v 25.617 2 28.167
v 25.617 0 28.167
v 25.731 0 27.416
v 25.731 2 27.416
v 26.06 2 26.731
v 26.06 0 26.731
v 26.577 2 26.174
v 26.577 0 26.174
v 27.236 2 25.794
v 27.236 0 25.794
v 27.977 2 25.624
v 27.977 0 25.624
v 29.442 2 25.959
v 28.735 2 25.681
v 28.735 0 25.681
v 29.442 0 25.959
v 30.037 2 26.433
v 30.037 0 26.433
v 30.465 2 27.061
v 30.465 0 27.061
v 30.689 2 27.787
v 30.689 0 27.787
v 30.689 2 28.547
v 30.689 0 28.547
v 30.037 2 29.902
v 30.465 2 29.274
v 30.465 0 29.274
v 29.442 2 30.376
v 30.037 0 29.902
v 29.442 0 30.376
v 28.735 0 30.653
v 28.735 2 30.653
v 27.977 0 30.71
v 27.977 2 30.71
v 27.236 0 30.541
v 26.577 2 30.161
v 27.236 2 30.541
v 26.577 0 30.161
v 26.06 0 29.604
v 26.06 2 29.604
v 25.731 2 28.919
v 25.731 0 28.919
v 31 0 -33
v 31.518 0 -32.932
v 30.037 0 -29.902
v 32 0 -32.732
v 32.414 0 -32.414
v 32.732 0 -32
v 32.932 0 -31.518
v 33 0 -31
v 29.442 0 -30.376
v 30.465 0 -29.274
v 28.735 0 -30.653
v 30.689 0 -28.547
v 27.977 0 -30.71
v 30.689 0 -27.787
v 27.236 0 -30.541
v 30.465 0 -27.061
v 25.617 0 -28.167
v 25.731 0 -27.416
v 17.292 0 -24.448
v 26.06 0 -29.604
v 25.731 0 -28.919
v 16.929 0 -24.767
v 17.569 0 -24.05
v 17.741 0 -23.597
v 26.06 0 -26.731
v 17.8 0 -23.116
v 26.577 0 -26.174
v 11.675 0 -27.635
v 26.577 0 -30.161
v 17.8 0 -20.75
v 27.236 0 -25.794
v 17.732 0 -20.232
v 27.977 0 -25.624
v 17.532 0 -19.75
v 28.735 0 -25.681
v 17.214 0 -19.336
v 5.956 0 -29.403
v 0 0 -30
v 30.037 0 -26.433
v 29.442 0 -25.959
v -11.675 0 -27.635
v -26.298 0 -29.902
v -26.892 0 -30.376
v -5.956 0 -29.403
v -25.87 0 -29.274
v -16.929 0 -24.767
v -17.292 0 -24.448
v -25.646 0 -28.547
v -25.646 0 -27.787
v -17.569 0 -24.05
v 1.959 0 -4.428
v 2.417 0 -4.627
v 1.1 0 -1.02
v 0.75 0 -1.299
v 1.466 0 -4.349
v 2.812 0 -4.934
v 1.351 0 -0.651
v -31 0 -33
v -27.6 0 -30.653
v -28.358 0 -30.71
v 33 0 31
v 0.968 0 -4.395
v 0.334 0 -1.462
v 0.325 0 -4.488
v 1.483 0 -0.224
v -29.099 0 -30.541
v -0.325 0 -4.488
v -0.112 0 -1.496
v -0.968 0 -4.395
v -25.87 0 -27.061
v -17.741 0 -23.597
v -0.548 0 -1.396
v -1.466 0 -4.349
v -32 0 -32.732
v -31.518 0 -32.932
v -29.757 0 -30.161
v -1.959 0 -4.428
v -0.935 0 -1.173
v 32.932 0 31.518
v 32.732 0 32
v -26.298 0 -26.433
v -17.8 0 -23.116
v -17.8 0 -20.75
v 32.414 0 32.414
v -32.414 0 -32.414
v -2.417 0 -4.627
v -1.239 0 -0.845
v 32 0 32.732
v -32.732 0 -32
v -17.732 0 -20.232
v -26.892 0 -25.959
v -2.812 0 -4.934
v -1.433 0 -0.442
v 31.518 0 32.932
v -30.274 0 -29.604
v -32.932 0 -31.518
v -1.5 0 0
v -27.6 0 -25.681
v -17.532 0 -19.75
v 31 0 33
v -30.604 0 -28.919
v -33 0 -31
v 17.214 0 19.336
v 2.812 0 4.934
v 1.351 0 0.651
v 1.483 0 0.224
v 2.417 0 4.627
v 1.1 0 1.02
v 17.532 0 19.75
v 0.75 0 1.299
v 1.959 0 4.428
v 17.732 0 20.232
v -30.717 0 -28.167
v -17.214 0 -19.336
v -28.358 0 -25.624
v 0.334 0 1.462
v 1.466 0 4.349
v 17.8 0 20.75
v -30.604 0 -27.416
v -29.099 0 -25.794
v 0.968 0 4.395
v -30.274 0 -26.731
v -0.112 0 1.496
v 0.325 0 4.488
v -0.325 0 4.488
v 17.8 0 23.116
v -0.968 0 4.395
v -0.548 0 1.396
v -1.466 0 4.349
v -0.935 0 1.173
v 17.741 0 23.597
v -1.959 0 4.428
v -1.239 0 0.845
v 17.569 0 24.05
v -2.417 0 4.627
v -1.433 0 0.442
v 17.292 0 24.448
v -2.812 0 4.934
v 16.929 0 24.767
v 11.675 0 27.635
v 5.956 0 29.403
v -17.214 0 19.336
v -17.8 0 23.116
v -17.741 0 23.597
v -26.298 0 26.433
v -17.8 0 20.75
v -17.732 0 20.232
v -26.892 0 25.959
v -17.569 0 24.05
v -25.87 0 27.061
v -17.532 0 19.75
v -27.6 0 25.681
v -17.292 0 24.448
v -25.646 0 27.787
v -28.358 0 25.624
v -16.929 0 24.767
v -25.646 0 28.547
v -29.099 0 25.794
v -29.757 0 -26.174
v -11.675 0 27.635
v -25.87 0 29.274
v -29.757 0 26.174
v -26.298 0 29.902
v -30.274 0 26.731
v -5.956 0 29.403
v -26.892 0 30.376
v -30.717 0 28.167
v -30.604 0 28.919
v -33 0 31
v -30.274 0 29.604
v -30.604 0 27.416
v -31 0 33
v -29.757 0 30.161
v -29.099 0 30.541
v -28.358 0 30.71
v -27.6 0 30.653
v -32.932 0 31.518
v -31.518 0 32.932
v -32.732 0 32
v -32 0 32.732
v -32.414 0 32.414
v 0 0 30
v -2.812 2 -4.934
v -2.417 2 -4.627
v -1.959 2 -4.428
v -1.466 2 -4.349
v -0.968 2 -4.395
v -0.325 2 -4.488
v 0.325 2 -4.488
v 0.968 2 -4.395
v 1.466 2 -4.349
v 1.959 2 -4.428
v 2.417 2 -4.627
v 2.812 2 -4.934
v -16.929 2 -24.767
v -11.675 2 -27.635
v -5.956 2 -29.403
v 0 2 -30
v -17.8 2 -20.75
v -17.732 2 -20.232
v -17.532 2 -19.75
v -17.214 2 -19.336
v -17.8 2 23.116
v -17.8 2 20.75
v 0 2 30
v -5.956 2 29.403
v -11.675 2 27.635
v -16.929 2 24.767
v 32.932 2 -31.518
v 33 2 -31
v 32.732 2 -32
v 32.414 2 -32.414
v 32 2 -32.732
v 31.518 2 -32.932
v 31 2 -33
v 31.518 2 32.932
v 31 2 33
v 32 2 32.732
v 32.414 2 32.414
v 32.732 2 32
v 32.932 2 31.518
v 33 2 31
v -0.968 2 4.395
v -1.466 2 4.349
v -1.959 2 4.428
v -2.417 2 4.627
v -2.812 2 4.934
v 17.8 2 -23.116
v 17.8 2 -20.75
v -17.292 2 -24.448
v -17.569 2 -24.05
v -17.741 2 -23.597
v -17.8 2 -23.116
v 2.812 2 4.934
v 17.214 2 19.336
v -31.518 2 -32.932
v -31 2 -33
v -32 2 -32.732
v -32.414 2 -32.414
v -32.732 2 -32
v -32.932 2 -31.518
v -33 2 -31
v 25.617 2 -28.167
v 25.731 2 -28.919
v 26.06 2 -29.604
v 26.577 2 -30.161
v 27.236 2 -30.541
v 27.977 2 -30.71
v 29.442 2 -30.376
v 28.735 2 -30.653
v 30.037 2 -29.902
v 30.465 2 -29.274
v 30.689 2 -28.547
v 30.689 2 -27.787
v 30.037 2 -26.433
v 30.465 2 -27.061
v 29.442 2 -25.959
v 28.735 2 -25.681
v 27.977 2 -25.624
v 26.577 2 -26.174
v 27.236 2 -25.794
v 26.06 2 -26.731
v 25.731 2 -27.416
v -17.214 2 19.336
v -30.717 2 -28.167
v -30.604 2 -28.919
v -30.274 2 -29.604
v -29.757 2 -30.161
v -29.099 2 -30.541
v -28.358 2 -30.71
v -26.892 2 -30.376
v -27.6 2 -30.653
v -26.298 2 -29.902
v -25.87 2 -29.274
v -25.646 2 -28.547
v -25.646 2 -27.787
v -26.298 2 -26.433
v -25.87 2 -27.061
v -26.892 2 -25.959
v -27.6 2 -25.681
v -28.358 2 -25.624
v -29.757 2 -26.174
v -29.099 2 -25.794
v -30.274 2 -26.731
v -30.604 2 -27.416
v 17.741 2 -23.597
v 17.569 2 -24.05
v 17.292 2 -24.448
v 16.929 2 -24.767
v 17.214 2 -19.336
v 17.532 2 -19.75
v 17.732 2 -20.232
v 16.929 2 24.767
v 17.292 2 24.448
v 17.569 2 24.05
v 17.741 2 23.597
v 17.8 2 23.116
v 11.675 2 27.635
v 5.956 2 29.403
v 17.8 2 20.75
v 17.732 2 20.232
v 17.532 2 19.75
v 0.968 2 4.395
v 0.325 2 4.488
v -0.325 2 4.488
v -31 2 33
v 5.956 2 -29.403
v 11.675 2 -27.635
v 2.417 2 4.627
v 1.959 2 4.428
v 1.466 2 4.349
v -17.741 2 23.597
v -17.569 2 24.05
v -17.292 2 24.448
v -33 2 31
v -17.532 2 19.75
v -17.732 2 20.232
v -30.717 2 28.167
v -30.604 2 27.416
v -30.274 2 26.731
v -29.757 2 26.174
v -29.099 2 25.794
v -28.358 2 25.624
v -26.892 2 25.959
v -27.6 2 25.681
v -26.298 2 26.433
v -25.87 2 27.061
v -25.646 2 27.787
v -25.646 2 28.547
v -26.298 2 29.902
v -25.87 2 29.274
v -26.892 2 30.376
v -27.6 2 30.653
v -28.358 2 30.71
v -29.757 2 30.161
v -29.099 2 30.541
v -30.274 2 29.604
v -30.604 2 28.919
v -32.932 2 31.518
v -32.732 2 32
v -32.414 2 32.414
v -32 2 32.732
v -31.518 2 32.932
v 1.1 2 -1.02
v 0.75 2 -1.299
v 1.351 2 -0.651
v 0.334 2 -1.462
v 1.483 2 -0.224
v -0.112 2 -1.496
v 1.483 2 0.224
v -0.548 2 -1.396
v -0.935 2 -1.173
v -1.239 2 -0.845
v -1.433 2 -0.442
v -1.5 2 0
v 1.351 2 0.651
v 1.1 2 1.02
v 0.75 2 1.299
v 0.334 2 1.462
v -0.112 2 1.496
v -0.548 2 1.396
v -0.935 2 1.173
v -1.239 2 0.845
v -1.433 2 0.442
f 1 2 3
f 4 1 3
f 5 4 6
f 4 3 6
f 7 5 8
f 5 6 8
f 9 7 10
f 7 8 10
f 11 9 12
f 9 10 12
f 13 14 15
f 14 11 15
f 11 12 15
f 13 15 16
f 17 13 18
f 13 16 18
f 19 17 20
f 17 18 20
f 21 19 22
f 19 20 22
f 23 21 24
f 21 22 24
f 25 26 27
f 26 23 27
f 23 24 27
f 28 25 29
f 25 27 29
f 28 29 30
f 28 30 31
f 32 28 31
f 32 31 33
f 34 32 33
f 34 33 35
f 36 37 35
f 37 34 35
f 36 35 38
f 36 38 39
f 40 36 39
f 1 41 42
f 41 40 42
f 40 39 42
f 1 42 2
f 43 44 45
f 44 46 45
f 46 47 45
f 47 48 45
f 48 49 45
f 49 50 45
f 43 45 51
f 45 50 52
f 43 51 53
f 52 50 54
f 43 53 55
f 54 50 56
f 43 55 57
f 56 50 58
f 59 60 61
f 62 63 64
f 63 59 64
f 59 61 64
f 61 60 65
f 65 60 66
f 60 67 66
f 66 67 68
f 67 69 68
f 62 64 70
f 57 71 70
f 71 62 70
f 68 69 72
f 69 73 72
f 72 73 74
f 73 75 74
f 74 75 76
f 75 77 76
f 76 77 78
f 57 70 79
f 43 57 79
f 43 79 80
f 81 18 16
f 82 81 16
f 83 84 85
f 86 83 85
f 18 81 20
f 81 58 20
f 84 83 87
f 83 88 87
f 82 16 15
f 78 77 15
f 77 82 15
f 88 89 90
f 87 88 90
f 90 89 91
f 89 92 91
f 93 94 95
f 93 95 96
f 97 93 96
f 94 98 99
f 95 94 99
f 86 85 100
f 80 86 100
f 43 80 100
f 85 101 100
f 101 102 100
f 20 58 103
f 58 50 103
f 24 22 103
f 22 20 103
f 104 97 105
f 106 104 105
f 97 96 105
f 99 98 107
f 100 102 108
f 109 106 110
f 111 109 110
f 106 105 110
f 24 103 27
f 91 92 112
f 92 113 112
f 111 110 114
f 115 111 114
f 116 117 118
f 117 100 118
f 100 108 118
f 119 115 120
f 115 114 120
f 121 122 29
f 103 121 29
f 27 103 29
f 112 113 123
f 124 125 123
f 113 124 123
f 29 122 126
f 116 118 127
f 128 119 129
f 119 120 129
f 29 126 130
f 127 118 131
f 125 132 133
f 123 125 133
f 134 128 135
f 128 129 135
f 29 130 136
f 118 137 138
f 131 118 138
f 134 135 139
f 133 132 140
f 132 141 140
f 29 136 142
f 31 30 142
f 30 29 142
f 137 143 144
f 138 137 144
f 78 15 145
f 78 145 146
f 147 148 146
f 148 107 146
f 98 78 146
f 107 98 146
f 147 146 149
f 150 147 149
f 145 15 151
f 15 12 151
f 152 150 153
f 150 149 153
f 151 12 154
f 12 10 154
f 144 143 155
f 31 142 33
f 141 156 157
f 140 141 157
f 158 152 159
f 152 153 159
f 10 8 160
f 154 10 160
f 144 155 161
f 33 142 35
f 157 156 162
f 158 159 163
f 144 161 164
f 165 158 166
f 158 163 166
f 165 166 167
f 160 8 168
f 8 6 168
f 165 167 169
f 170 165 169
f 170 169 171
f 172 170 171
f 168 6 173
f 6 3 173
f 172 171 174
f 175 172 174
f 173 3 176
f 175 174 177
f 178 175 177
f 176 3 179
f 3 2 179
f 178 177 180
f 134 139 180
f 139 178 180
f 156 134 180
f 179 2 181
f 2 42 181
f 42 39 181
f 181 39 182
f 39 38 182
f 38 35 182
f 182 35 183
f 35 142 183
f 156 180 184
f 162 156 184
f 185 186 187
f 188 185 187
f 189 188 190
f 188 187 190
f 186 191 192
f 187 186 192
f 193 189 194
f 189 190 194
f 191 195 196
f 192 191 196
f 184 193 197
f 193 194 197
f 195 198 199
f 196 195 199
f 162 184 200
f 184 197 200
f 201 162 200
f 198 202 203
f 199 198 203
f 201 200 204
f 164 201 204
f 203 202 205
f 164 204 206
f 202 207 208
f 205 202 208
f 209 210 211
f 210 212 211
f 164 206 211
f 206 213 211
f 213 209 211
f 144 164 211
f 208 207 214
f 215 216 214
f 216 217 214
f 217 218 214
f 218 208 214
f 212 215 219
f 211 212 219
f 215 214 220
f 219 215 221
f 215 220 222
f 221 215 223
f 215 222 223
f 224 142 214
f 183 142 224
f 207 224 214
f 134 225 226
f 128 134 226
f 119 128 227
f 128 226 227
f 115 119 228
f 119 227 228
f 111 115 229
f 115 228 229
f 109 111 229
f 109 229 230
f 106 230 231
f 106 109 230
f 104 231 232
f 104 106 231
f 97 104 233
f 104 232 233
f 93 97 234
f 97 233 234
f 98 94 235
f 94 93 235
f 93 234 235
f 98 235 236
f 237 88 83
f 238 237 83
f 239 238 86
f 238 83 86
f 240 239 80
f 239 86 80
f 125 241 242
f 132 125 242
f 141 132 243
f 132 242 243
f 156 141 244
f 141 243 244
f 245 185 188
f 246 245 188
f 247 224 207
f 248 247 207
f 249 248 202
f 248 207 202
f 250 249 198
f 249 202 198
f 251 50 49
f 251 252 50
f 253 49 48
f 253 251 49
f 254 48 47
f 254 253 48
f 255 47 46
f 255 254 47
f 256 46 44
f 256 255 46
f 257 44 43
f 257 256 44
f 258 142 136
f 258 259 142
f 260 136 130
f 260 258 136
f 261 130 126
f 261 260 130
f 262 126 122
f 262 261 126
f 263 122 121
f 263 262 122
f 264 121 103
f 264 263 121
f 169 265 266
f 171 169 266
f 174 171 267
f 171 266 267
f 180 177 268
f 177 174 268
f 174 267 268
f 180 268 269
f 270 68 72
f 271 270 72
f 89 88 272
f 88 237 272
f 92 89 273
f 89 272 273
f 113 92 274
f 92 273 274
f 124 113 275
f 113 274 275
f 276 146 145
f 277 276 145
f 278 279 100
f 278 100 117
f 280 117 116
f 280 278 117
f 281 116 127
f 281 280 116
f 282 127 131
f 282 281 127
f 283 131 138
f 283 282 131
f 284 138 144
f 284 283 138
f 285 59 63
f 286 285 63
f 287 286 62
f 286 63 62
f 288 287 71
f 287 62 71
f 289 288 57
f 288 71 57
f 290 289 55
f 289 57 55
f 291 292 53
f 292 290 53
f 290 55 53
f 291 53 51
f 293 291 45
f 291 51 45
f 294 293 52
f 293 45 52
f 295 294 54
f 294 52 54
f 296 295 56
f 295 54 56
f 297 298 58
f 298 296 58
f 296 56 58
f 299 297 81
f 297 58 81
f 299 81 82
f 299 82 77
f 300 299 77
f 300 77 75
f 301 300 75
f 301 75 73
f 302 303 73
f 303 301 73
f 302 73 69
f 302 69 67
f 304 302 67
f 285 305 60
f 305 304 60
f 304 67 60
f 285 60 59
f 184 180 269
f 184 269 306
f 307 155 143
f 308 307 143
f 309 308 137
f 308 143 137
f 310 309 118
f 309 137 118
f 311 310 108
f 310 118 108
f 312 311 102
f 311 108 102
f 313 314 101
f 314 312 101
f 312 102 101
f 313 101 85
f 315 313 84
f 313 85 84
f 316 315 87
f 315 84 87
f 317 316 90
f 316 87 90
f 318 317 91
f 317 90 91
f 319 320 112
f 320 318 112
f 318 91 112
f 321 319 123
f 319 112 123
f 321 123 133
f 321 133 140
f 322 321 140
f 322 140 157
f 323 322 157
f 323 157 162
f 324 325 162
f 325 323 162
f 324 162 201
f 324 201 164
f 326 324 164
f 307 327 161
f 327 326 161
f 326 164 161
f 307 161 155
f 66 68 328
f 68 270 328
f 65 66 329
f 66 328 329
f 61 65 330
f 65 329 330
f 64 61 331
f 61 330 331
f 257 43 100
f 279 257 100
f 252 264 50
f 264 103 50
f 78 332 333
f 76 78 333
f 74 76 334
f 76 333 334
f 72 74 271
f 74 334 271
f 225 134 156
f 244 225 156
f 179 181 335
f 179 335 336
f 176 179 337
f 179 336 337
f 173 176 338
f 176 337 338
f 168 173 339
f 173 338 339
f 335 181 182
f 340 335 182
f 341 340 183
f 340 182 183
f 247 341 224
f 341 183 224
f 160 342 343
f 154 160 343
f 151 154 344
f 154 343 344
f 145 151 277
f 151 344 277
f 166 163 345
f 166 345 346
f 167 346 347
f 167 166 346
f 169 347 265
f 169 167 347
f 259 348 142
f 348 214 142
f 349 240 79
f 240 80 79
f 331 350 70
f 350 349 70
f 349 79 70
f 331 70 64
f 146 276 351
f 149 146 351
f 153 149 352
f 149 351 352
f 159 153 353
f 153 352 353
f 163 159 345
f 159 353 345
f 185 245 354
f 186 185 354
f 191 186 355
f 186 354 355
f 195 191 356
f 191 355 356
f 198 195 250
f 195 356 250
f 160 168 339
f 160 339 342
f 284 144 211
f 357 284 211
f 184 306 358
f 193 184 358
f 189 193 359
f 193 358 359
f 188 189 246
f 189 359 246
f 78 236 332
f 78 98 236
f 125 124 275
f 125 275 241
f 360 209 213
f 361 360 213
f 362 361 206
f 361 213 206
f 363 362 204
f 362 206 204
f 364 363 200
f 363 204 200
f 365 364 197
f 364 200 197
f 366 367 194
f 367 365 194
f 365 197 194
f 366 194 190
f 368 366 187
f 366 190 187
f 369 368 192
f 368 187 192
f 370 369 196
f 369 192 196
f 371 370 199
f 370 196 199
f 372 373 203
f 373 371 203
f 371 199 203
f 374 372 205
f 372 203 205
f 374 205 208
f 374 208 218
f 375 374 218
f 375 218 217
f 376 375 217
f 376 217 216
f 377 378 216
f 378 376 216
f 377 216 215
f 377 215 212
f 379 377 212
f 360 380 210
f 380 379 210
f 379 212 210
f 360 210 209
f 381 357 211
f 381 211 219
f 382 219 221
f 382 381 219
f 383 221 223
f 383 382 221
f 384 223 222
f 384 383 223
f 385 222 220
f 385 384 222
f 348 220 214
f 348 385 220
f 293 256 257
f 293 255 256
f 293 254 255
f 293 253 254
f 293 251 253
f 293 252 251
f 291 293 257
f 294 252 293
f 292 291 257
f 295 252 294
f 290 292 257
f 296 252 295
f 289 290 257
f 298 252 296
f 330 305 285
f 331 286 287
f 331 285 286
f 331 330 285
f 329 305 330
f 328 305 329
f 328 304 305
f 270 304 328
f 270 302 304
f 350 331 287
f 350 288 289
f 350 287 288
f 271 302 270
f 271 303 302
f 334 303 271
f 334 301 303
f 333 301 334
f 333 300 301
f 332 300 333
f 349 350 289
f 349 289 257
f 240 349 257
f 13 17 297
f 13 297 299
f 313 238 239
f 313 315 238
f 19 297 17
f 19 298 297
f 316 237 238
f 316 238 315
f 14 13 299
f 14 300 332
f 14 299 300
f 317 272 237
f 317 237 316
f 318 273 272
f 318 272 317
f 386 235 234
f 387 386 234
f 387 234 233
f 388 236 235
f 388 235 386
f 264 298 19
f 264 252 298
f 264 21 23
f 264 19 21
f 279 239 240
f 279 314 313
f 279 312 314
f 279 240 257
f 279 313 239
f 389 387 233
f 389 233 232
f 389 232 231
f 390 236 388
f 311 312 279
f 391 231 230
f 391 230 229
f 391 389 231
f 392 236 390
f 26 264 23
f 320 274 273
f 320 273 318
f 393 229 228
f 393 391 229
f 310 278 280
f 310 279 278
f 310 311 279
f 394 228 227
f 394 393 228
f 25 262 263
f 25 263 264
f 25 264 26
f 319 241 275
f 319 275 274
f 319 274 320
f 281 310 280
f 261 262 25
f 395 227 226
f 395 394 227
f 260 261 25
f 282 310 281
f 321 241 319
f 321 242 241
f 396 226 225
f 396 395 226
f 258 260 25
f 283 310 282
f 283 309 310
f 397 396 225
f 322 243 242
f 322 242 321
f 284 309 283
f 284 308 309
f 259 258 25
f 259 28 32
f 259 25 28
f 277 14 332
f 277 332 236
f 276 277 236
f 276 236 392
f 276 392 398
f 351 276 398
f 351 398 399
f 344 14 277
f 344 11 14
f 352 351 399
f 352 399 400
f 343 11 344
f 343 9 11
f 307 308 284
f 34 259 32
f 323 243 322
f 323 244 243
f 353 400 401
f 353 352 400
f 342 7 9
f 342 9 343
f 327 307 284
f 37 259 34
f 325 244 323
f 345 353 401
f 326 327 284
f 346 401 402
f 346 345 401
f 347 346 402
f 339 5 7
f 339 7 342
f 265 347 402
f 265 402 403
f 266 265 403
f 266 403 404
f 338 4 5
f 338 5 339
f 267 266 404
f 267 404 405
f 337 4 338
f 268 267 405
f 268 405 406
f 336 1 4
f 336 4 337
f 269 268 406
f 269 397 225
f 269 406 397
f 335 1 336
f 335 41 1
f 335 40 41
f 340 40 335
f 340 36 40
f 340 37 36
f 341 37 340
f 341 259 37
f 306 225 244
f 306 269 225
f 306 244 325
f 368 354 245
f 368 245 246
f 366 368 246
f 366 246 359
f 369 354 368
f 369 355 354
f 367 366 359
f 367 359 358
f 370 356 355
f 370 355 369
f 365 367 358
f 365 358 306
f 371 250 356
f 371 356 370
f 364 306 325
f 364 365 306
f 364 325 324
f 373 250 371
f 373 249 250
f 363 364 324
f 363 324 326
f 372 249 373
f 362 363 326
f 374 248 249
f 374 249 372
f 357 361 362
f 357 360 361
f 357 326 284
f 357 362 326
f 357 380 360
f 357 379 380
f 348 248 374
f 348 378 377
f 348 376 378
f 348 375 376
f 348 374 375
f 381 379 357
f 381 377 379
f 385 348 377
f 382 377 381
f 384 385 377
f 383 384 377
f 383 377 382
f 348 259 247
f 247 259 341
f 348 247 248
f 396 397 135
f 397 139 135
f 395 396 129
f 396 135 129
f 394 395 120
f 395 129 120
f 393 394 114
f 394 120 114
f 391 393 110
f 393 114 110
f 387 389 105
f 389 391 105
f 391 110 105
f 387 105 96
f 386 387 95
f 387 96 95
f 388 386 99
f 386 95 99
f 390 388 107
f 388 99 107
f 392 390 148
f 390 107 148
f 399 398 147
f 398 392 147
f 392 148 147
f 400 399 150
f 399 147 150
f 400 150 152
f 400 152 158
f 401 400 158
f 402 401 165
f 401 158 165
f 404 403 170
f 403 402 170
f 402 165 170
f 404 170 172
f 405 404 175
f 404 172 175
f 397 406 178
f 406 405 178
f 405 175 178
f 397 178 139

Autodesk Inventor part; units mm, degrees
ref_plane "YZ Plane" through (0, 0, 0) normal (1, 0, 0) x (0, 1, 0)
ref_plane "XZ Plane" through (0, 0, 0) normal (0, 1, 0) x (-1, 0, 0)
ref_plane "XY Plane" through (0, 0, 0) normal (0, 0, 1) x (1, 0, 0)
sketch "Sketch1" plane through (0, 0, 0) normal (0, 1, 0) x (-1, 0, 0)
  arc A0 (20.126, -22.2473) -> (-20.126, -22.2473) centre (0, 0) ccw construction
  circle A1 centre (0, 0) radius 33 construction
  line L0 (33, 33) -> (-33, 33)
  line L1 (-33, 33) -> (-33, -33)
  line L2 (-33, -33) -> (33, -33)
  line L3 (33, -33) -> (33, 33)
  line L4 (33, 33) -> (23.3345, 23.3345) construction
  line L5 (-33, 33) -> (-23.3345, 23.3345) construction
  line L6 (23.3345, 23.3345) -> (-23.3345, -23.3345) construction
  line L7 (23.3345, -23.3345) -> (33, -33) construction
  line L8 (-23.3345, -23.3345) -> (-33, -33) construction
  line L9 (-23.3345, 23.3345) -> (23.3345, -23.3345) construction
  line L10 (0, -33) -> (0, 33) construction
  line L11 (33, 0) -> (-33, 0) construction
  circle A2 centre (0, 0) radius 1.5
  circle A3 centre (0, 0) radius 4.5
  line L12 (4.0607, -1.9393) -> (22.2473, -20.126) construction
  line L13 (1.9393, -4.0607) -> (17.8, -19.9213)
  arc A4 (0, -30) -> (17.8, -24.1487) centre (0, 0) ccw
  line L14 (23.3345, 23.3345) -> (-23.3345, -23.3345) construction
  line L15 (-4.0607, -1.9393) -> (-22.2473, -20.126) construction
  line L16 (-1.9393, -4.0607) -> (-17.8, -19.9213)
  arc A5 (-20.126, -22.2473) -> (-17.8, -24.1487) centre (0, 0) ccw construction
  line L17 (17.8, -24.1487) -> (17.8, -19.9213)
  line L18 (-17.8, -24.1487) -> (-17.8, -19.9213)
  line L19 (17.8, -22.035) -> (-17.8, -22.035) construction
  arc A6 (-17.8, -24.1487) -> (0, -30) centre (0, 0) ccw
  line L20 (-17.8, -19.9213) -> (-20.126, -22.2473) construction
  line L21 (17.8, -19.9213) -> (20.126, -22.2473) construction
  arc A7 (17.8, -24.1487) -> (20.126, -22.2473) centre (0, 0) ccw construction
  line L22 (1.9393, 4.0607) -> (17.8, 19.9213)
  arc A8 (17.8, 24.1487) -> (0, 30) centre (0, 0) ccw
  line L23 (-1.9393, 4.0607) -> (-17.8, 19.9213)
  arc A9 (-17.8, 24.1487) -> (-20.126, 22.2473) centre (0, 0) ccw construction
  line L24 (17.8, 24.1487) -> (17.8, 19.9213)
  line L25 (-17.8, 24.1487) -> (-17.8, 19.9213)
  arc A10 (0, 30) -> (-17.8, 24.1487) centre (0, 0) ccw
  line L26 (-17.8, 19.9213) -> (-20.126, 22.2473) construction
  line L27 (17.8, 19.9213) -> (20.126, 22.2473) construction
  arc A11 (20.126, 22.2473) -> (17.8, 24.1487) centre (0, 0) ccw construction
  circle A12 centre (28.1673, -28.1673) radius 2.55
  circle A13 centre (-28.1673, -28.1673) radius 2.55
  circle A14 centre (-28.1673, 28.1673) radius 2.55
  circle A15 centre (28.1673, 28.1673) radius 2.55
  point P0 (0, -22.035)
  dimension "d22" = 60
  dimension "d24" = 3
  dimension "d25" = 3
  dimension "d26" = 3
  dimension "d27" = 1.5
  dimension "d28" = 3
  dimension "d31" = 35.6
  dimension "d32" = 5.1
  dimension "d33" = 5.1
  dimension "d34" = 5.1
  dimension "d35" = 5.1
extrude "Extrusion1" add sketch "Sketch1" along normal blind 2 contours L3 L2 L1 L0 | A3
fillet "Fillet3" radius 2 16 edges at (-17.8, 1, 19.9213) (-1.9393, 1, 4.0607) (1.9393, 1, 4.0607) (-17.8, 1, 24.1487) (17.8, 1, 24.1487) (17.8, 1, 19.9213) (-1.9393, 1, -4.0607) (1.9393, 1, -4.0607) (17.8, 1, -19.9213) (17.8, 1, -24.1487) (-17.8, 1, -19.9213) (-17.8, 1, -24.1487) (-33, 1, 33) (-33, 1, -33) (33, 1, -33) (33, 1, 33)
properties part number "Feeder Bottom Plate" material "Aluminum 6061"
